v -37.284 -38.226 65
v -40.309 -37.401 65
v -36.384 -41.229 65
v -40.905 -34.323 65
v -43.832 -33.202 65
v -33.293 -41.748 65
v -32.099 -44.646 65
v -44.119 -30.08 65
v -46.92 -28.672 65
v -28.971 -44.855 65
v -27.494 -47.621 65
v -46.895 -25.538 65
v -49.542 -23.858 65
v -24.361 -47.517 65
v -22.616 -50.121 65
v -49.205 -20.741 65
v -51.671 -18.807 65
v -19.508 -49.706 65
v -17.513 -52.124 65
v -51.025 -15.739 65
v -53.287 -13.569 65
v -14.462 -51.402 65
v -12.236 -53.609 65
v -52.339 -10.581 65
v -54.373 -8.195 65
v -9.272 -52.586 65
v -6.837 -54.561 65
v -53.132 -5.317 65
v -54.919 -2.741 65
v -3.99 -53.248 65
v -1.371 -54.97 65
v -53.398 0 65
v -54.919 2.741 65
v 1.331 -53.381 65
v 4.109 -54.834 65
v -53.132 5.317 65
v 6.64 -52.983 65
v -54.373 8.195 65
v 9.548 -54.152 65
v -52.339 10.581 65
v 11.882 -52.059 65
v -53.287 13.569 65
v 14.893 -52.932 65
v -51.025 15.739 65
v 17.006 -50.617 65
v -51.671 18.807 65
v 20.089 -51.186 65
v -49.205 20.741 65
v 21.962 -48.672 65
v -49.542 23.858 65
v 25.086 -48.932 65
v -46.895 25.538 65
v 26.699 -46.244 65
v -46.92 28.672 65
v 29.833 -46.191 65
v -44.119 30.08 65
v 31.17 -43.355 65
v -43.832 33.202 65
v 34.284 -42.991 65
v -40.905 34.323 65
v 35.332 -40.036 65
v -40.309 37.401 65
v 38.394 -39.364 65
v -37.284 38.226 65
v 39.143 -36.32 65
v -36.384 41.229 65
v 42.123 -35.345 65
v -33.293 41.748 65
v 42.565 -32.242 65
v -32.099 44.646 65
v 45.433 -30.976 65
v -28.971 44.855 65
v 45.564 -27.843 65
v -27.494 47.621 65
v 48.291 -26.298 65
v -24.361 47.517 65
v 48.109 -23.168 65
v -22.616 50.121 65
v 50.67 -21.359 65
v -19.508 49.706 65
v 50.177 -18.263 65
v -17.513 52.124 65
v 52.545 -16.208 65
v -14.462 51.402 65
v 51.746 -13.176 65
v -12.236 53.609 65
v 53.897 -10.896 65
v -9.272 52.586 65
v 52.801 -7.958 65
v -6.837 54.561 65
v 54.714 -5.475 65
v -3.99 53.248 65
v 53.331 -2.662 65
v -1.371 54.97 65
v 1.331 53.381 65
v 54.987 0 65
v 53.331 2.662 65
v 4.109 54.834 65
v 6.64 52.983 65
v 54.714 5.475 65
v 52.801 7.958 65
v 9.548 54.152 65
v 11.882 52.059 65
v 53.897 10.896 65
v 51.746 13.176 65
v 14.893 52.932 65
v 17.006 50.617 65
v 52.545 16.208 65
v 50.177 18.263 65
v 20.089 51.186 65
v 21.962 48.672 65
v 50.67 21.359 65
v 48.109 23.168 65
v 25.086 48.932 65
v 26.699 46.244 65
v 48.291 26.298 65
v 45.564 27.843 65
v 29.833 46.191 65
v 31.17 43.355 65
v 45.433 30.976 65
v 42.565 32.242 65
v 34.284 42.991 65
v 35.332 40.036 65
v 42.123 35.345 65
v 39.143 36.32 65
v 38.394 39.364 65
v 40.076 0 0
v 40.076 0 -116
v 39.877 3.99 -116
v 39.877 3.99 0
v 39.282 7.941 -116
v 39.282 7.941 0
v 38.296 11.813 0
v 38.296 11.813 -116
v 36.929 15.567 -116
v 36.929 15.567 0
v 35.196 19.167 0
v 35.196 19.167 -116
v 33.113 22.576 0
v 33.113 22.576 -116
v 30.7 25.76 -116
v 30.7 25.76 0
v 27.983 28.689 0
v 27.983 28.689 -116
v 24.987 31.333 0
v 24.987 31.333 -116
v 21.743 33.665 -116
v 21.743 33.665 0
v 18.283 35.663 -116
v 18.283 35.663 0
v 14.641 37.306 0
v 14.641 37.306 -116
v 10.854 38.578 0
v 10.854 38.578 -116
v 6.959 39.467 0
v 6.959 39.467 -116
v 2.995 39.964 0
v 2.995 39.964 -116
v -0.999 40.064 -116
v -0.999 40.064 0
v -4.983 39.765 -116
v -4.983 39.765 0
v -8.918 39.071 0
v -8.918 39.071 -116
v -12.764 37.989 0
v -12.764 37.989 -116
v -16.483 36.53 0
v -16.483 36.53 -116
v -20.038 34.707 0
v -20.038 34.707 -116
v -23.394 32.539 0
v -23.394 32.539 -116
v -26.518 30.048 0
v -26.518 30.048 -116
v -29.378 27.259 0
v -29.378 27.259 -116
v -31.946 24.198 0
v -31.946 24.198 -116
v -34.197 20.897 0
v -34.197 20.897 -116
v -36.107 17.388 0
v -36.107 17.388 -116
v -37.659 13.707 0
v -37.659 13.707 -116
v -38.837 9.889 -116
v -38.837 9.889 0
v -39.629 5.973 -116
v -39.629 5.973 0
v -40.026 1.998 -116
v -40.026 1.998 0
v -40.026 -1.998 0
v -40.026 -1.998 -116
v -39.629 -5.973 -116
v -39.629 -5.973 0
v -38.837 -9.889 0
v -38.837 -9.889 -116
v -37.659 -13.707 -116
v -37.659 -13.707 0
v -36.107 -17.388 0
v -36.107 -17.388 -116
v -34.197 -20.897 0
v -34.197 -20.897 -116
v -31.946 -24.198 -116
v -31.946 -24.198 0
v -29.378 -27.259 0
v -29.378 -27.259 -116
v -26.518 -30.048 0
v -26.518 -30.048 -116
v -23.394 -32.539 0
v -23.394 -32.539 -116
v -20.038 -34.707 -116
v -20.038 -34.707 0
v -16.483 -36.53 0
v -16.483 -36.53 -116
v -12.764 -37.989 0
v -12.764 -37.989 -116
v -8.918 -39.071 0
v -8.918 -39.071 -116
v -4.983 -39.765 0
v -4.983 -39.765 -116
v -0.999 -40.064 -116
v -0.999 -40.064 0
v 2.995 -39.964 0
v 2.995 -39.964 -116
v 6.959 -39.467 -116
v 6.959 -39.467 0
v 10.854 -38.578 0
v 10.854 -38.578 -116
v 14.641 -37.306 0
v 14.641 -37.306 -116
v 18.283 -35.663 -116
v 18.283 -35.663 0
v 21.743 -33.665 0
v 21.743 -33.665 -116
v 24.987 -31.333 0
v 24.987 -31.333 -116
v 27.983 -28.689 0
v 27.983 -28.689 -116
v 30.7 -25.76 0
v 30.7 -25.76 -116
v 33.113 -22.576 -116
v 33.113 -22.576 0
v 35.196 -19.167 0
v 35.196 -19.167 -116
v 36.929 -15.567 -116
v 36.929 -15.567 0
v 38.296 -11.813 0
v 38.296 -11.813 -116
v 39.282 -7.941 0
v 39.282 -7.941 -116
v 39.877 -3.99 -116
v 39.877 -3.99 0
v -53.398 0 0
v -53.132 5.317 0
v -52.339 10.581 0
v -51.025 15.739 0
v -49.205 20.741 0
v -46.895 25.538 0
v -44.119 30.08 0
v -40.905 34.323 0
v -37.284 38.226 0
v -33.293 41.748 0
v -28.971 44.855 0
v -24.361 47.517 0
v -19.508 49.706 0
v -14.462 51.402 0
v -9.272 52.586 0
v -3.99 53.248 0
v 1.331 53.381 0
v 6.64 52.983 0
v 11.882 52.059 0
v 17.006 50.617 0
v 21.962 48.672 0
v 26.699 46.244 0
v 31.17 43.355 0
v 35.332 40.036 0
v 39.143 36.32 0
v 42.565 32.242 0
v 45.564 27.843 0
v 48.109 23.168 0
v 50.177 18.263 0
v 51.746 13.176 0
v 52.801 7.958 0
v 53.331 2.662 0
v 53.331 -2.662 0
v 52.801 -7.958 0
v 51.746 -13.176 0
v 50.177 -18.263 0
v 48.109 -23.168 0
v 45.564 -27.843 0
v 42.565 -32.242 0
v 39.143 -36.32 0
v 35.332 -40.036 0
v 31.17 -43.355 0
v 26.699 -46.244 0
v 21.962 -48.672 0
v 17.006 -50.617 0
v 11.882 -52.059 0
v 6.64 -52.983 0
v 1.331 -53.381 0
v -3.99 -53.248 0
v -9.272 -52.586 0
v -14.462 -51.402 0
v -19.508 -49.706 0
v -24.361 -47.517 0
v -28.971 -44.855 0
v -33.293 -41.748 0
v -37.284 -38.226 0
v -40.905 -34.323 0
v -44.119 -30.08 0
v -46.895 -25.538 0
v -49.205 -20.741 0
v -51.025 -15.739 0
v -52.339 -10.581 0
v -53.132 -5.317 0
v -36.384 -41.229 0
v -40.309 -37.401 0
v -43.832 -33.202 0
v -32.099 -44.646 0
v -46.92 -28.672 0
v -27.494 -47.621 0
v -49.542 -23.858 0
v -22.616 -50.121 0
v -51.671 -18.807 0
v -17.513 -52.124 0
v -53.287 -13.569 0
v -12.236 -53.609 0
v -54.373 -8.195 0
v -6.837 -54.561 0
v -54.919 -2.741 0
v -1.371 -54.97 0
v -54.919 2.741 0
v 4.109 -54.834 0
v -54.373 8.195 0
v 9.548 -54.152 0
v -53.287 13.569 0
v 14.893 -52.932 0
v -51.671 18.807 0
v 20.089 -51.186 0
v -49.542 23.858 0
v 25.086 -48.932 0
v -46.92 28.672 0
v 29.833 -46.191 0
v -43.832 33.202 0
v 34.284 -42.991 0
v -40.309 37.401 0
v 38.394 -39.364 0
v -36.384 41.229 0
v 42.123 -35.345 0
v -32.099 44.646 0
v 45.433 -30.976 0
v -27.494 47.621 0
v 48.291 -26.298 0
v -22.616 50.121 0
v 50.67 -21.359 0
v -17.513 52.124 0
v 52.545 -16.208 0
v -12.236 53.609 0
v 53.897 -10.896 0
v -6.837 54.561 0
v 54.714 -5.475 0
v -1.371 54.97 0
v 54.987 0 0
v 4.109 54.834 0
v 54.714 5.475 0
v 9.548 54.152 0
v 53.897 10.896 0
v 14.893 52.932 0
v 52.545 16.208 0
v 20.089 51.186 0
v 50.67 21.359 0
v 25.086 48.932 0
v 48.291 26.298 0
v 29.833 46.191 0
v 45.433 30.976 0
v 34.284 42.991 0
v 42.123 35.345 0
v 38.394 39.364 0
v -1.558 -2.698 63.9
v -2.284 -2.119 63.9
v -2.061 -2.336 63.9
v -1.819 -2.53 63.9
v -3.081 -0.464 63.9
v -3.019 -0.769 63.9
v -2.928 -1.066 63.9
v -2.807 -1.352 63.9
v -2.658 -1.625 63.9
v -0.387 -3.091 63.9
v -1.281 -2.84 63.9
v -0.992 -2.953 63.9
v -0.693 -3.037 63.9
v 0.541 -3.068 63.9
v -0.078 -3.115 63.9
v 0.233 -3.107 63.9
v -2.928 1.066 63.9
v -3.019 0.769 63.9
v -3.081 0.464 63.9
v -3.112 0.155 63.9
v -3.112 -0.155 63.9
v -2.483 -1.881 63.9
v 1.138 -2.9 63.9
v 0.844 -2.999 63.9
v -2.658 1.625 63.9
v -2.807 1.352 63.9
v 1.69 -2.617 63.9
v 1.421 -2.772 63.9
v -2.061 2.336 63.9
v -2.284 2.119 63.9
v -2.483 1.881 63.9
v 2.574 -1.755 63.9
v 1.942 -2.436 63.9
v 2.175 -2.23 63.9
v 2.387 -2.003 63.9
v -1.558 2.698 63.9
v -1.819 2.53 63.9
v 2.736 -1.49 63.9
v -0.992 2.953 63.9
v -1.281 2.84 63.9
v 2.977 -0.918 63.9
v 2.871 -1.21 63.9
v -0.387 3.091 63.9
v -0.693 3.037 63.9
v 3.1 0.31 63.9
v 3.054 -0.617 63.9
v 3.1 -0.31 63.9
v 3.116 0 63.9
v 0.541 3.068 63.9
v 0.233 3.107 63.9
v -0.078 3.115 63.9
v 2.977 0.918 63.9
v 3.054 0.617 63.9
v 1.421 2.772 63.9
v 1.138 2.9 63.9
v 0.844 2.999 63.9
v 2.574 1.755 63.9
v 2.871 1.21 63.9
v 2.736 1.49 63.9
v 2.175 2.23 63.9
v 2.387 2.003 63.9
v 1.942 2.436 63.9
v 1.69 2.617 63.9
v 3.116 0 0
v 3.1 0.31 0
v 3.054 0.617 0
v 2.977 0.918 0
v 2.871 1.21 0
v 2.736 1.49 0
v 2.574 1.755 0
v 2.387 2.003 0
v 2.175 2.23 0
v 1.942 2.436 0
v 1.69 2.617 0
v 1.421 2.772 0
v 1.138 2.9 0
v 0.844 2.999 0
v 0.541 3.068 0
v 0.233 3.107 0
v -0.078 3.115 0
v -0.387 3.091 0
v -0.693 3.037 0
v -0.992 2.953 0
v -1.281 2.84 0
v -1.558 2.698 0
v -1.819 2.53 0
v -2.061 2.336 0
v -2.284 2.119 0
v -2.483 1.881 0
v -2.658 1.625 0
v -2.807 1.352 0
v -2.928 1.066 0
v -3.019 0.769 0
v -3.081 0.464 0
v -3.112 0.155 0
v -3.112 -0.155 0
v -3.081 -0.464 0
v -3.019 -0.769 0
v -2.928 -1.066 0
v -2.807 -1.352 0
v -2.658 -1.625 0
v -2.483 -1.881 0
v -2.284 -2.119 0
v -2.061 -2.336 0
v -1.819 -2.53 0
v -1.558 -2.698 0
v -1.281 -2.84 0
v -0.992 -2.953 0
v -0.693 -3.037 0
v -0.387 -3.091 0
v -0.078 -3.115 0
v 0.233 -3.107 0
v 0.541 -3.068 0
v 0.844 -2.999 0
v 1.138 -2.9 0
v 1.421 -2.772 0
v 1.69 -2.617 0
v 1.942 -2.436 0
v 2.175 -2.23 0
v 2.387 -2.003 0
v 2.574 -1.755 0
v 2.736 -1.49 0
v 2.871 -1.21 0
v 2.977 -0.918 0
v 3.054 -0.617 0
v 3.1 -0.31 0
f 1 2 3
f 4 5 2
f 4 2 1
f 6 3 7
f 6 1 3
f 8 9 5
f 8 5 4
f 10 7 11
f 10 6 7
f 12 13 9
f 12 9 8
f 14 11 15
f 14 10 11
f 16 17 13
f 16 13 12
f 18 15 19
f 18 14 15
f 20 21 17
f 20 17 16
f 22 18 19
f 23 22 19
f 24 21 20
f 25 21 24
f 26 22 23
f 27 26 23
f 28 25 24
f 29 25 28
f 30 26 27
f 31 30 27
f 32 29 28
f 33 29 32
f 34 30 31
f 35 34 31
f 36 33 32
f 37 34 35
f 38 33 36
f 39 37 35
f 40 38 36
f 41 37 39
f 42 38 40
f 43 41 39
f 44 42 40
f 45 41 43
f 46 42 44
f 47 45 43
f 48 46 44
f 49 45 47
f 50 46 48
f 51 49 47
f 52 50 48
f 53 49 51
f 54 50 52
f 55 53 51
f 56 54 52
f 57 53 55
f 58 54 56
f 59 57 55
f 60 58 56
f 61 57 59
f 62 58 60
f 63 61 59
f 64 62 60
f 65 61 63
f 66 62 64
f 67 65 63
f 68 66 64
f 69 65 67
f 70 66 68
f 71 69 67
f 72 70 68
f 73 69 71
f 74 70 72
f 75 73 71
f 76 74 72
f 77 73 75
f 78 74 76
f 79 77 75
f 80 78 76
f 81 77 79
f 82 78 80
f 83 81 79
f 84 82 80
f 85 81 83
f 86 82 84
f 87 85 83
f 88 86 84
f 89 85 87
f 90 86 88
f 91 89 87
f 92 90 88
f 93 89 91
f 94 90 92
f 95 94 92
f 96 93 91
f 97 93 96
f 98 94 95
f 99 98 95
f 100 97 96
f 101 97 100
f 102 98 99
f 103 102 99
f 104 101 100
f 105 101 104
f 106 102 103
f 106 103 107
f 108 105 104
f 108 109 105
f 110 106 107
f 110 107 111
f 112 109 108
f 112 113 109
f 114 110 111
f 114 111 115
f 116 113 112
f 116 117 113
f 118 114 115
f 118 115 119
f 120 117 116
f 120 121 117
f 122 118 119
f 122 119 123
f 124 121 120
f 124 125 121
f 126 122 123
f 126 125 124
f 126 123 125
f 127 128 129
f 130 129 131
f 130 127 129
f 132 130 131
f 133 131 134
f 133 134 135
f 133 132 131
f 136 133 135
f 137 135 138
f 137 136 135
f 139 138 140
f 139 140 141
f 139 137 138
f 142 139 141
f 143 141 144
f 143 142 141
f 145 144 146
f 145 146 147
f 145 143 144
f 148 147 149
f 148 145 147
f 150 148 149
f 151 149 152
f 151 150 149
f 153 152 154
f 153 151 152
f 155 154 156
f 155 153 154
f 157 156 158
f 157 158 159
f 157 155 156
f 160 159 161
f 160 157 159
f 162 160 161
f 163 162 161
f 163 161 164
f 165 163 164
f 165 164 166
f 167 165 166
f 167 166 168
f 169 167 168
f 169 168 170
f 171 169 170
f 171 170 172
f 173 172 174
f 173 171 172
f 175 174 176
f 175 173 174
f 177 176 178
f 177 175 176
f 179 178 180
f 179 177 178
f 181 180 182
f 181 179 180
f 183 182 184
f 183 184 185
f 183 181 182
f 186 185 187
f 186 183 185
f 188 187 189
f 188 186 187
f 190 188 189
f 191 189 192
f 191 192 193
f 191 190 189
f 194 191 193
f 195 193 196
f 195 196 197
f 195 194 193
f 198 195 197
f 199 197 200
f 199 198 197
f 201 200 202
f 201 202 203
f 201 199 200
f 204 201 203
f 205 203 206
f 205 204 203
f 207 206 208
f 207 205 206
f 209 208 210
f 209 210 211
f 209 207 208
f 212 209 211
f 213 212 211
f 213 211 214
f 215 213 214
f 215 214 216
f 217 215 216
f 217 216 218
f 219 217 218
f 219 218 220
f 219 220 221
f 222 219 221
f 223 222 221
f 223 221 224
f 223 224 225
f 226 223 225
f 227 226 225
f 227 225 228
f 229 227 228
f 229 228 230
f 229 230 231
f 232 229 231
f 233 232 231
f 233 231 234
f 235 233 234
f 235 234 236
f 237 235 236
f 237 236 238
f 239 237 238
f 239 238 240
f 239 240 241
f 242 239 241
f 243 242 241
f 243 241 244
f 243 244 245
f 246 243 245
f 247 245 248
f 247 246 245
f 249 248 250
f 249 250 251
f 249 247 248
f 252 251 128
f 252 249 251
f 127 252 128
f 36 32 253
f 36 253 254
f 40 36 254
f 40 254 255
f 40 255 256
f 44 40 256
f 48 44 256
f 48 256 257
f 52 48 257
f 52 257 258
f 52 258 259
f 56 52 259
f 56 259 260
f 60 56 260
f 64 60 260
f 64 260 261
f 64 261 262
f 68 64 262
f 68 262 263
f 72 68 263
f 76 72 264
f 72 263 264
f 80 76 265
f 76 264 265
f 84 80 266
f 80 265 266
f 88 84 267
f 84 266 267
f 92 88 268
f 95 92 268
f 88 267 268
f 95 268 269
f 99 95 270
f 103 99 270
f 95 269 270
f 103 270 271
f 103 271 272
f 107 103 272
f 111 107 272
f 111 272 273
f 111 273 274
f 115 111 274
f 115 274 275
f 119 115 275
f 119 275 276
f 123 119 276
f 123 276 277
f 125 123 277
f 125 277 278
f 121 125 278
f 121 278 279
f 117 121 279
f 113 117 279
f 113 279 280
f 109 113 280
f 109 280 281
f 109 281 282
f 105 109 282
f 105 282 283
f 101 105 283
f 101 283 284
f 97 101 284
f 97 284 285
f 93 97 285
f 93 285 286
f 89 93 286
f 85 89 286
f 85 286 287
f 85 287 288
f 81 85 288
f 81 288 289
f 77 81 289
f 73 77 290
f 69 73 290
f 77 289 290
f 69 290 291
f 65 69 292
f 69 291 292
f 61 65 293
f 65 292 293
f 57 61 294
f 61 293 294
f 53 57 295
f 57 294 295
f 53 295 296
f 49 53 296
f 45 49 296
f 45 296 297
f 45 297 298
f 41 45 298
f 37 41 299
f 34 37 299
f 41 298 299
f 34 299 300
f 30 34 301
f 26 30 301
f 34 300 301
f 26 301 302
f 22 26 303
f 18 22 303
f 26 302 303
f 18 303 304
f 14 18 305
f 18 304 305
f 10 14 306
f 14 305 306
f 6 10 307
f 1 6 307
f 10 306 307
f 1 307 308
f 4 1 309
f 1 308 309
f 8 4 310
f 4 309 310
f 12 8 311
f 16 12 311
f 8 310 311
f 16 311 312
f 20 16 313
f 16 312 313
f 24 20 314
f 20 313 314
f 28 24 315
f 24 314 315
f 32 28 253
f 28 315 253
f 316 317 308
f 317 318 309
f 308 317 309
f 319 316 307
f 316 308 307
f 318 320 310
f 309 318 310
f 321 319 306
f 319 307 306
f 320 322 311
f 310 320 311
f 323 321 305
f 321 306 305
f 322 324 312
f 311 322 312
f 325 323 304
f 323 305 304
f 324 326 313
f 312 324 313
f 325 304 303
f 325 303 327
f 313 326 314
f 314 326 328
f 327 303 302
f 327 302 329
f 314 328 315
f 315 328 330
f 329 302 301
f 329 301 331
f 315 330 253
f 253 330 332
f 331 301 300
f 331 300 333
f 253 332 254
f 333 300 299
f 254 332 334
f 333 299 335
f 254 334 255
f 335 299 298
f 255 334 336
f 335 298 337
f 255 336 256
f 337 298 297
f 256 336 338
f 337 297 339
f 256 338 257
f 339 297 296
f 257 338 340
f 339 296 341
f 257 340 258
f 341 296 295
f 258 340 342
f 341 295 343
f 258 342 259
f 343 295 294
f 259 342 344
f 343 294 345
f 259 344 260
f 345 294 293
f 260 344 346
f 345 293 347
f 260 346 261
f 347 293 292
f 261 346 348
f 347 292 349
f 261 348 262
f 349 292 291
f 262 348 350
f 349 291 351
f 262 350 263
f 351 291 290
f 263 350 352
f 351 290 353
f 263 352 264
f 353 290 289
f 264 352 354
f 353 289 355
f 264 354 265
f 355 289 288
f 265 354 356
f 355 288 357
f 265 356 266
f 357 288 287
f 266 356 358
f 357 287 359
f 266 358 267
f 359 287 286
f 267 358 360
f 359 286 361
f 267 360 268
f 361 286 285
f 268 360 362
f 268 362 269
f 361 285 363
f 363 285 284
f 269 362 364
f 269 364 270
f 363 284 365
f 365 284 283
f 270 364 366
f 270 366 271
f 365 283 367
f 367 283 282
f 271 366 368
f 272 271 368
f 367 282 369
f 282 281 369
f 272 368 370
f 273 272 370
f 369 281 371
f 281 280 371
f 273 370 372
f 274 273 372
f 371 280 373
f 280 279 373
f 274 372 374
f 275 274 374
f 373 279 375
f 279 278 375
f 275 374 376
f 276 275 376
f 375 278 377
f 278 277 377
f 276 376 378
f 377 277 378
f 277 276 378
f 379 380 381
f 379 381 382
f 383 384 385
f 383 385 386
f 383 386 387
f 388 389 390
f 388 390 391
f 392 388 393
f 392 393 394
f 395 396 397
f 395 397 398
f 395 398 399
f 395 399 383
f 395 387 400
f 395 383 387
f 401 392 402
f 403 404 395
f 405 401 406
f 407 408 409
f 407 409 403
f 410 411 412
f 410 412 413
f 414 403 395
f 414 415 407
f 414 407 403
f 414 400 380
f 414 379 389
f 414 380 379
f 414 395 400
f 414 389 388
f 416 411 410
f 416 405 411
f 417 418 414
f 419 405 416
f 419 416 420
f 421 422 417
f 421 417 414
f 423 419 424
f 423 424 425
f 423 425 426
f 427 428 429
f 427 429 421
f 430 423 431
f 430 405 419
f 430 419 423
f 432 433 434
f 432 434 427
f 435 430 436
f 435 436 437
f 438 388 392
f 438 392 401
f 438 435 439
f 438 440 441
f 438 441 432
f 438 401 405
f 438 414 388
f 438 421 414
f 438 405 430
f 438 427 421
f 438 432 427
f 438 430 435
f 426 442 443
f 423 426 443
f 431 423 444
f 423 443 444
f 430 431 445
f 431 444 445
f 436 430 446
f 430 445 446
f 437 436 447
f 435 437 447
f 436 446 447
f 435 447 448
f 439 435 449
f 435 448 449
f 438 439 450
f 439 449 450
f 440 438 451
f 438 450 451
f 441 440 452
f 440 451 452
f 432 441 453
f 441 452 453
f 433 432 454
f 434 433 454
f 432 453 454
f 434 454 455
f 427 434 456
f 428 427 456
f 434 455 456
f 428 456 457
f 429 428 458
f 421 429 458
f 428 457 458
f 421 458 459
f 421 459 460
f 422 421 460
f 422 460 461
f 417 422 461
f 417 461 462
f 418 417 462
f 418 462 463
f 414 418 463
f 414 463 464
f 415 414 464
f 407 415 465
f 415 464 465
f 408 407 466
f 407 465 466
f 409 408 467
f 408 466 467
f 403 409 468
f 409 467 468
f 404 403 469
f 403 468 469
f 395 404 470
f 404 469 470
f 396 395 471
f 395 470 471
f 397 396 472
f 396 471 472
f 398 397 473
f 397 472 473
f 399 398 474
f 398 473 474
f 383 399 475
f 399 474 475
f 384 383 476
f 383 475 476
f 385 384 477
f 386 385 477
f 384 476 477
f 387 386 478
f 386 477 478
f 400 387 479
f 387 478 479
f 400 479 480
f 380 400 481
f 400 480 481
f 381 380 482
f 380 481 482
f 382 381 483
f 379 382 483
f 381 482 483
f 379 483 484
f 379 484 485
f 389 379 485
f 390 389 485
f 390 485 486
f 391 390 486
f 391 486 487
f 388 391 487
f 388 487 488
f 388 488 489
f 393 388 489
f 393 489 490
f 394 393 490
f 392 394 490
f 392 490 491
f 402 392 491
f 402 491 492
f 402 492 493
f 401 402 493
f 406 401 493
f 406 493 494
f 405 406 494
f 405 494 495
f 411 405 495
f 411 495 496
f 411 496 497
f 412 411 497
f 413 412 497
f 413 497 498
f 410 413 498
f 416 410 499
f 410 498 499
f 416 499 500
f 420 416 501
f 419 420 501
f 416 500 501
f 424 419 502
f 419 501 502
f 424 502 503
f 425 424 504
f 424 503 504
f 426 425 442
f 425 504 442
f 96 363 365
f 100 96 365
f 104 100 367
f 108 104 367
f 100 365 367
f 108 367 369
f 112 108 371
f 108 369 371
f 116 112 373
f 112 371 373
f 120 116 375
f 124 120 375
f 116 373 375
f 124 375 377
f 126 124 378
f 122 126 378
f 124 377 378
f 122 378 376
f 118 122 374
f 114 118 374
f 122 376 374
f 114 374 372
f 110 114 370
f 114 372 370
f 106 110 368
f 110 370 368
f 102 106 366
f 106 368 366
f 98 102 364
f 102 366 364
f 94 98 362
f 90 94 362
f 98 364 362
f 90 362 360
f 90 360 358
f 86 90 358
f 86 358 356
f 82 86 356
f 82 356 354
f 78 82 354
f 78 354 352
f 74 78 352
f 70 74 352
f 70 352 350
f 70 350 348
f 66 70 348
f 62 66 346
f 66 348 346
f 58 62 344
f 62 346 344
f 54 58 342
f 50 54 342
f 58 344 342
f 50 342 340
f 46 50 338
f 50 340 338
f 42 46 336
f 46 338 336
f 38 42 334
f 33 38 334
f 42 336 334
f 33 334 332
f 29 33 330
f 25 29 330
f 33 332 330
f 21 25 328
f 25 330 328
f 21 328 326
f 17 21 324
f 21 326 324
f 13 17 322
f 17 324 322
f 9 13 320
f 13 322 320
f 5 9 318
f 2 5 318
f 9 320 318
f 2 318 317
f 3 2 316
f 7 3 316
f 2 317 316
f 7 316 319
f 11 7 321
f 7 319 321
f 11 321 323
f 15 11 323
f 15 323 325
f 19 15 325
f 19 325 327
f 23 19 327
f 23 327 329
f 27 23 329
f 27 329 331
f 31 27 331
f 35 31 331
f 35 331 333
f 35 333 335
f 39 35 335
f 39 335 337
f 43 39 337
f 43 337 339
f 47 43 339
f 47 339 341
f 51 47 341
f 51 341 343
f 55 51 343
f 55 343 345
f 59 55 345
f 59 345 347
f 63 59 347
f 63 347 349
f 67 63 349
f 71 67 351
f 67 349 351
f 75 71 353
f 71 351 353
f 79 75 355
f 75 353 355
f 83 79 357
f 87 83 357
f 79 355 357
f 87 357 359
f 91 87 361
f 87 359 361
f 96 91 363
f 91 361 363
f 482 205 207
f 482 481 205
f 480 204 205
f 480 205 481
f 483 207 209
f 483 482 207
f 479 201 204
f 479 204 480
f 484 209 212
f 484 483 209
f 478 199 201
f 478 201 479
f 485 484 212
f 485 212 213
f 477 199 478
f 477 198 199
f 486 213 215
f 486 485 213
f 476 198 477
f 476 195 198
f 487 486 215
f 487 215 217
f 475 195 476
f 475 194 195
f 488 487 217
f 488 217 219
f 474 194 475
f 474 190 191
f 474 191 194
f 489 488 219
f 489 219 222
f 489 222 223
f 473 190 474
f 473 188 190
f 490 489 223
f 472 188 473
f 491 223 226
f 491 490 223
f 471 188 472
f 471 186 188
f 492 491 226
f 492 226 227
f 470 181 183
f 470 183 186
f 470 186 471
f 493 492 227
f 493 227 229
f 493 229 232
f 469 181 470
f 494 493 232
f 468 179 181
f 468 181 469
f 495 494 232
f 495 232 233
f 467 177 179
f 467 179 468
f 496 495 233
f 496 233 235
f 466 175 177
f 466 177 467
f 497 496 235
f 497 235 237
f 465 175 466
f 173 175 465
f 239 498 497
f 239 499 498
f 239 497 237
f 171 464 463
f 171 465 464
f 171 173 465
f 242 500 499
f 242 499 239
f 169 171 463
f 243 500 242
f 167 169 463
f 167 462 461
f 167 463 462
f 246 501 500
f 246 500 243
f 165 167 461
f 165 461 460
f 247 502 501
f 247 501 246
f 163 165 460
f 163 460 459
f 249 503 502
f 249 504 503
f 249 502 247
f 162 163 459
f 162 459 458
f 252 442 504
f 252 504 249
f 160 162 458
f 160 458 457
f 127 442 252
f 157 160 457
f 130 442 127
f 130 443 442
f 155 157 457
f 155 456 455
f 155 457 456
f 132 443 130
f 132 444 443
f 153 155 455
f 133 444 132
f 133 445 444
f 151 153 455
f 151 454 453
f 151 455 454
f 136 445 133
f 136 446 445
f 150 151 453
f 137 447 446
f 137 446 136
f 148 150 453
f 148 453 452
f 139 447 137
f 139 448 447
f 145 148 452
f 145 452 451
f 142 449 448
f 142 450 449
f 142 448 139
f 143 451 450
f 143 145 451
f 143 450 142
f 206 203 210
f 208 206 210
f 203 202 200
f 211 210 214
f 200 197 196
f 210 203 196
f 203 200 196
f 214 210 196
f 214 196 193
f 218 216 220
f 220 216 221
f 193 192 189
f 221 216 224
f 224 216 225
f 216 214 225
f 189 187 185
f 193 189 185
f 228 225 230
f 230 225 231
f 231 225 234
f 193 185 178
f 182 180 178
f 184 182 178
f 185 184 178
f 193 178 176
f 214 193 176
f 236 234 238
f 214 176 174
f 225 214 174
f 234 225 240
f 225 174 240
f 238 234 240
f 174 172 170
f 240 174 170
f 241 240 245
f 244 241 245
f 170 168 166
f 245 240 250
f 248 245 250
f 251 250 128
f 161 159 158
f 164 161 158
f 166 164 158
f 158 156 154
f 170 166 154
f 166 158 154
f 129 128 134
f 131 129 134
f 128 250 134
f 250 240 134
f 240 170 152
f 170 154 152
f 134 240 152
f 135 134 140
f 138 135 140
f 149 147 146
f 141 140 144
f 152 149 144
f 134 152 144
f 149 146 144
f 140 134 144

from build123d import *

# Parameters (mm, degrees)
F0_R     = 54.987438
F1_DEPTH = 65
F3_D     = 106.795
F4_R     = 3.1155
F5_DEPTH = 63.9
F6_R     = 40.076196
F7_DEPTH = 116


with BuildPart() as f1:
    # F0 (on Top) → F1 (new body)
    with BuildSketch(Plane.XY):
        Circle(F0_R)
    extrude(amount=F1_DEPTH)

    # F3 (through all)
    with Locations(Plane.XY.offset(65)):
        with Locations((0, 0)):
            Hole(F3_D / 2)


with BuildPart() as f5:
    # F4 (on Top) → F5 (new body)
    with BuildSketch(Plane.XY):
        Circle(F4_R)
    extrude(amount=F5_DEPTH)

    # F6 (on Top) → F7 (join)
    with BuildSketch(Plane.XY):
        Circle(F6_R)
    extrude(amount=-F7_DEPTH)


solid = Compound([f1.part, f5.part])
